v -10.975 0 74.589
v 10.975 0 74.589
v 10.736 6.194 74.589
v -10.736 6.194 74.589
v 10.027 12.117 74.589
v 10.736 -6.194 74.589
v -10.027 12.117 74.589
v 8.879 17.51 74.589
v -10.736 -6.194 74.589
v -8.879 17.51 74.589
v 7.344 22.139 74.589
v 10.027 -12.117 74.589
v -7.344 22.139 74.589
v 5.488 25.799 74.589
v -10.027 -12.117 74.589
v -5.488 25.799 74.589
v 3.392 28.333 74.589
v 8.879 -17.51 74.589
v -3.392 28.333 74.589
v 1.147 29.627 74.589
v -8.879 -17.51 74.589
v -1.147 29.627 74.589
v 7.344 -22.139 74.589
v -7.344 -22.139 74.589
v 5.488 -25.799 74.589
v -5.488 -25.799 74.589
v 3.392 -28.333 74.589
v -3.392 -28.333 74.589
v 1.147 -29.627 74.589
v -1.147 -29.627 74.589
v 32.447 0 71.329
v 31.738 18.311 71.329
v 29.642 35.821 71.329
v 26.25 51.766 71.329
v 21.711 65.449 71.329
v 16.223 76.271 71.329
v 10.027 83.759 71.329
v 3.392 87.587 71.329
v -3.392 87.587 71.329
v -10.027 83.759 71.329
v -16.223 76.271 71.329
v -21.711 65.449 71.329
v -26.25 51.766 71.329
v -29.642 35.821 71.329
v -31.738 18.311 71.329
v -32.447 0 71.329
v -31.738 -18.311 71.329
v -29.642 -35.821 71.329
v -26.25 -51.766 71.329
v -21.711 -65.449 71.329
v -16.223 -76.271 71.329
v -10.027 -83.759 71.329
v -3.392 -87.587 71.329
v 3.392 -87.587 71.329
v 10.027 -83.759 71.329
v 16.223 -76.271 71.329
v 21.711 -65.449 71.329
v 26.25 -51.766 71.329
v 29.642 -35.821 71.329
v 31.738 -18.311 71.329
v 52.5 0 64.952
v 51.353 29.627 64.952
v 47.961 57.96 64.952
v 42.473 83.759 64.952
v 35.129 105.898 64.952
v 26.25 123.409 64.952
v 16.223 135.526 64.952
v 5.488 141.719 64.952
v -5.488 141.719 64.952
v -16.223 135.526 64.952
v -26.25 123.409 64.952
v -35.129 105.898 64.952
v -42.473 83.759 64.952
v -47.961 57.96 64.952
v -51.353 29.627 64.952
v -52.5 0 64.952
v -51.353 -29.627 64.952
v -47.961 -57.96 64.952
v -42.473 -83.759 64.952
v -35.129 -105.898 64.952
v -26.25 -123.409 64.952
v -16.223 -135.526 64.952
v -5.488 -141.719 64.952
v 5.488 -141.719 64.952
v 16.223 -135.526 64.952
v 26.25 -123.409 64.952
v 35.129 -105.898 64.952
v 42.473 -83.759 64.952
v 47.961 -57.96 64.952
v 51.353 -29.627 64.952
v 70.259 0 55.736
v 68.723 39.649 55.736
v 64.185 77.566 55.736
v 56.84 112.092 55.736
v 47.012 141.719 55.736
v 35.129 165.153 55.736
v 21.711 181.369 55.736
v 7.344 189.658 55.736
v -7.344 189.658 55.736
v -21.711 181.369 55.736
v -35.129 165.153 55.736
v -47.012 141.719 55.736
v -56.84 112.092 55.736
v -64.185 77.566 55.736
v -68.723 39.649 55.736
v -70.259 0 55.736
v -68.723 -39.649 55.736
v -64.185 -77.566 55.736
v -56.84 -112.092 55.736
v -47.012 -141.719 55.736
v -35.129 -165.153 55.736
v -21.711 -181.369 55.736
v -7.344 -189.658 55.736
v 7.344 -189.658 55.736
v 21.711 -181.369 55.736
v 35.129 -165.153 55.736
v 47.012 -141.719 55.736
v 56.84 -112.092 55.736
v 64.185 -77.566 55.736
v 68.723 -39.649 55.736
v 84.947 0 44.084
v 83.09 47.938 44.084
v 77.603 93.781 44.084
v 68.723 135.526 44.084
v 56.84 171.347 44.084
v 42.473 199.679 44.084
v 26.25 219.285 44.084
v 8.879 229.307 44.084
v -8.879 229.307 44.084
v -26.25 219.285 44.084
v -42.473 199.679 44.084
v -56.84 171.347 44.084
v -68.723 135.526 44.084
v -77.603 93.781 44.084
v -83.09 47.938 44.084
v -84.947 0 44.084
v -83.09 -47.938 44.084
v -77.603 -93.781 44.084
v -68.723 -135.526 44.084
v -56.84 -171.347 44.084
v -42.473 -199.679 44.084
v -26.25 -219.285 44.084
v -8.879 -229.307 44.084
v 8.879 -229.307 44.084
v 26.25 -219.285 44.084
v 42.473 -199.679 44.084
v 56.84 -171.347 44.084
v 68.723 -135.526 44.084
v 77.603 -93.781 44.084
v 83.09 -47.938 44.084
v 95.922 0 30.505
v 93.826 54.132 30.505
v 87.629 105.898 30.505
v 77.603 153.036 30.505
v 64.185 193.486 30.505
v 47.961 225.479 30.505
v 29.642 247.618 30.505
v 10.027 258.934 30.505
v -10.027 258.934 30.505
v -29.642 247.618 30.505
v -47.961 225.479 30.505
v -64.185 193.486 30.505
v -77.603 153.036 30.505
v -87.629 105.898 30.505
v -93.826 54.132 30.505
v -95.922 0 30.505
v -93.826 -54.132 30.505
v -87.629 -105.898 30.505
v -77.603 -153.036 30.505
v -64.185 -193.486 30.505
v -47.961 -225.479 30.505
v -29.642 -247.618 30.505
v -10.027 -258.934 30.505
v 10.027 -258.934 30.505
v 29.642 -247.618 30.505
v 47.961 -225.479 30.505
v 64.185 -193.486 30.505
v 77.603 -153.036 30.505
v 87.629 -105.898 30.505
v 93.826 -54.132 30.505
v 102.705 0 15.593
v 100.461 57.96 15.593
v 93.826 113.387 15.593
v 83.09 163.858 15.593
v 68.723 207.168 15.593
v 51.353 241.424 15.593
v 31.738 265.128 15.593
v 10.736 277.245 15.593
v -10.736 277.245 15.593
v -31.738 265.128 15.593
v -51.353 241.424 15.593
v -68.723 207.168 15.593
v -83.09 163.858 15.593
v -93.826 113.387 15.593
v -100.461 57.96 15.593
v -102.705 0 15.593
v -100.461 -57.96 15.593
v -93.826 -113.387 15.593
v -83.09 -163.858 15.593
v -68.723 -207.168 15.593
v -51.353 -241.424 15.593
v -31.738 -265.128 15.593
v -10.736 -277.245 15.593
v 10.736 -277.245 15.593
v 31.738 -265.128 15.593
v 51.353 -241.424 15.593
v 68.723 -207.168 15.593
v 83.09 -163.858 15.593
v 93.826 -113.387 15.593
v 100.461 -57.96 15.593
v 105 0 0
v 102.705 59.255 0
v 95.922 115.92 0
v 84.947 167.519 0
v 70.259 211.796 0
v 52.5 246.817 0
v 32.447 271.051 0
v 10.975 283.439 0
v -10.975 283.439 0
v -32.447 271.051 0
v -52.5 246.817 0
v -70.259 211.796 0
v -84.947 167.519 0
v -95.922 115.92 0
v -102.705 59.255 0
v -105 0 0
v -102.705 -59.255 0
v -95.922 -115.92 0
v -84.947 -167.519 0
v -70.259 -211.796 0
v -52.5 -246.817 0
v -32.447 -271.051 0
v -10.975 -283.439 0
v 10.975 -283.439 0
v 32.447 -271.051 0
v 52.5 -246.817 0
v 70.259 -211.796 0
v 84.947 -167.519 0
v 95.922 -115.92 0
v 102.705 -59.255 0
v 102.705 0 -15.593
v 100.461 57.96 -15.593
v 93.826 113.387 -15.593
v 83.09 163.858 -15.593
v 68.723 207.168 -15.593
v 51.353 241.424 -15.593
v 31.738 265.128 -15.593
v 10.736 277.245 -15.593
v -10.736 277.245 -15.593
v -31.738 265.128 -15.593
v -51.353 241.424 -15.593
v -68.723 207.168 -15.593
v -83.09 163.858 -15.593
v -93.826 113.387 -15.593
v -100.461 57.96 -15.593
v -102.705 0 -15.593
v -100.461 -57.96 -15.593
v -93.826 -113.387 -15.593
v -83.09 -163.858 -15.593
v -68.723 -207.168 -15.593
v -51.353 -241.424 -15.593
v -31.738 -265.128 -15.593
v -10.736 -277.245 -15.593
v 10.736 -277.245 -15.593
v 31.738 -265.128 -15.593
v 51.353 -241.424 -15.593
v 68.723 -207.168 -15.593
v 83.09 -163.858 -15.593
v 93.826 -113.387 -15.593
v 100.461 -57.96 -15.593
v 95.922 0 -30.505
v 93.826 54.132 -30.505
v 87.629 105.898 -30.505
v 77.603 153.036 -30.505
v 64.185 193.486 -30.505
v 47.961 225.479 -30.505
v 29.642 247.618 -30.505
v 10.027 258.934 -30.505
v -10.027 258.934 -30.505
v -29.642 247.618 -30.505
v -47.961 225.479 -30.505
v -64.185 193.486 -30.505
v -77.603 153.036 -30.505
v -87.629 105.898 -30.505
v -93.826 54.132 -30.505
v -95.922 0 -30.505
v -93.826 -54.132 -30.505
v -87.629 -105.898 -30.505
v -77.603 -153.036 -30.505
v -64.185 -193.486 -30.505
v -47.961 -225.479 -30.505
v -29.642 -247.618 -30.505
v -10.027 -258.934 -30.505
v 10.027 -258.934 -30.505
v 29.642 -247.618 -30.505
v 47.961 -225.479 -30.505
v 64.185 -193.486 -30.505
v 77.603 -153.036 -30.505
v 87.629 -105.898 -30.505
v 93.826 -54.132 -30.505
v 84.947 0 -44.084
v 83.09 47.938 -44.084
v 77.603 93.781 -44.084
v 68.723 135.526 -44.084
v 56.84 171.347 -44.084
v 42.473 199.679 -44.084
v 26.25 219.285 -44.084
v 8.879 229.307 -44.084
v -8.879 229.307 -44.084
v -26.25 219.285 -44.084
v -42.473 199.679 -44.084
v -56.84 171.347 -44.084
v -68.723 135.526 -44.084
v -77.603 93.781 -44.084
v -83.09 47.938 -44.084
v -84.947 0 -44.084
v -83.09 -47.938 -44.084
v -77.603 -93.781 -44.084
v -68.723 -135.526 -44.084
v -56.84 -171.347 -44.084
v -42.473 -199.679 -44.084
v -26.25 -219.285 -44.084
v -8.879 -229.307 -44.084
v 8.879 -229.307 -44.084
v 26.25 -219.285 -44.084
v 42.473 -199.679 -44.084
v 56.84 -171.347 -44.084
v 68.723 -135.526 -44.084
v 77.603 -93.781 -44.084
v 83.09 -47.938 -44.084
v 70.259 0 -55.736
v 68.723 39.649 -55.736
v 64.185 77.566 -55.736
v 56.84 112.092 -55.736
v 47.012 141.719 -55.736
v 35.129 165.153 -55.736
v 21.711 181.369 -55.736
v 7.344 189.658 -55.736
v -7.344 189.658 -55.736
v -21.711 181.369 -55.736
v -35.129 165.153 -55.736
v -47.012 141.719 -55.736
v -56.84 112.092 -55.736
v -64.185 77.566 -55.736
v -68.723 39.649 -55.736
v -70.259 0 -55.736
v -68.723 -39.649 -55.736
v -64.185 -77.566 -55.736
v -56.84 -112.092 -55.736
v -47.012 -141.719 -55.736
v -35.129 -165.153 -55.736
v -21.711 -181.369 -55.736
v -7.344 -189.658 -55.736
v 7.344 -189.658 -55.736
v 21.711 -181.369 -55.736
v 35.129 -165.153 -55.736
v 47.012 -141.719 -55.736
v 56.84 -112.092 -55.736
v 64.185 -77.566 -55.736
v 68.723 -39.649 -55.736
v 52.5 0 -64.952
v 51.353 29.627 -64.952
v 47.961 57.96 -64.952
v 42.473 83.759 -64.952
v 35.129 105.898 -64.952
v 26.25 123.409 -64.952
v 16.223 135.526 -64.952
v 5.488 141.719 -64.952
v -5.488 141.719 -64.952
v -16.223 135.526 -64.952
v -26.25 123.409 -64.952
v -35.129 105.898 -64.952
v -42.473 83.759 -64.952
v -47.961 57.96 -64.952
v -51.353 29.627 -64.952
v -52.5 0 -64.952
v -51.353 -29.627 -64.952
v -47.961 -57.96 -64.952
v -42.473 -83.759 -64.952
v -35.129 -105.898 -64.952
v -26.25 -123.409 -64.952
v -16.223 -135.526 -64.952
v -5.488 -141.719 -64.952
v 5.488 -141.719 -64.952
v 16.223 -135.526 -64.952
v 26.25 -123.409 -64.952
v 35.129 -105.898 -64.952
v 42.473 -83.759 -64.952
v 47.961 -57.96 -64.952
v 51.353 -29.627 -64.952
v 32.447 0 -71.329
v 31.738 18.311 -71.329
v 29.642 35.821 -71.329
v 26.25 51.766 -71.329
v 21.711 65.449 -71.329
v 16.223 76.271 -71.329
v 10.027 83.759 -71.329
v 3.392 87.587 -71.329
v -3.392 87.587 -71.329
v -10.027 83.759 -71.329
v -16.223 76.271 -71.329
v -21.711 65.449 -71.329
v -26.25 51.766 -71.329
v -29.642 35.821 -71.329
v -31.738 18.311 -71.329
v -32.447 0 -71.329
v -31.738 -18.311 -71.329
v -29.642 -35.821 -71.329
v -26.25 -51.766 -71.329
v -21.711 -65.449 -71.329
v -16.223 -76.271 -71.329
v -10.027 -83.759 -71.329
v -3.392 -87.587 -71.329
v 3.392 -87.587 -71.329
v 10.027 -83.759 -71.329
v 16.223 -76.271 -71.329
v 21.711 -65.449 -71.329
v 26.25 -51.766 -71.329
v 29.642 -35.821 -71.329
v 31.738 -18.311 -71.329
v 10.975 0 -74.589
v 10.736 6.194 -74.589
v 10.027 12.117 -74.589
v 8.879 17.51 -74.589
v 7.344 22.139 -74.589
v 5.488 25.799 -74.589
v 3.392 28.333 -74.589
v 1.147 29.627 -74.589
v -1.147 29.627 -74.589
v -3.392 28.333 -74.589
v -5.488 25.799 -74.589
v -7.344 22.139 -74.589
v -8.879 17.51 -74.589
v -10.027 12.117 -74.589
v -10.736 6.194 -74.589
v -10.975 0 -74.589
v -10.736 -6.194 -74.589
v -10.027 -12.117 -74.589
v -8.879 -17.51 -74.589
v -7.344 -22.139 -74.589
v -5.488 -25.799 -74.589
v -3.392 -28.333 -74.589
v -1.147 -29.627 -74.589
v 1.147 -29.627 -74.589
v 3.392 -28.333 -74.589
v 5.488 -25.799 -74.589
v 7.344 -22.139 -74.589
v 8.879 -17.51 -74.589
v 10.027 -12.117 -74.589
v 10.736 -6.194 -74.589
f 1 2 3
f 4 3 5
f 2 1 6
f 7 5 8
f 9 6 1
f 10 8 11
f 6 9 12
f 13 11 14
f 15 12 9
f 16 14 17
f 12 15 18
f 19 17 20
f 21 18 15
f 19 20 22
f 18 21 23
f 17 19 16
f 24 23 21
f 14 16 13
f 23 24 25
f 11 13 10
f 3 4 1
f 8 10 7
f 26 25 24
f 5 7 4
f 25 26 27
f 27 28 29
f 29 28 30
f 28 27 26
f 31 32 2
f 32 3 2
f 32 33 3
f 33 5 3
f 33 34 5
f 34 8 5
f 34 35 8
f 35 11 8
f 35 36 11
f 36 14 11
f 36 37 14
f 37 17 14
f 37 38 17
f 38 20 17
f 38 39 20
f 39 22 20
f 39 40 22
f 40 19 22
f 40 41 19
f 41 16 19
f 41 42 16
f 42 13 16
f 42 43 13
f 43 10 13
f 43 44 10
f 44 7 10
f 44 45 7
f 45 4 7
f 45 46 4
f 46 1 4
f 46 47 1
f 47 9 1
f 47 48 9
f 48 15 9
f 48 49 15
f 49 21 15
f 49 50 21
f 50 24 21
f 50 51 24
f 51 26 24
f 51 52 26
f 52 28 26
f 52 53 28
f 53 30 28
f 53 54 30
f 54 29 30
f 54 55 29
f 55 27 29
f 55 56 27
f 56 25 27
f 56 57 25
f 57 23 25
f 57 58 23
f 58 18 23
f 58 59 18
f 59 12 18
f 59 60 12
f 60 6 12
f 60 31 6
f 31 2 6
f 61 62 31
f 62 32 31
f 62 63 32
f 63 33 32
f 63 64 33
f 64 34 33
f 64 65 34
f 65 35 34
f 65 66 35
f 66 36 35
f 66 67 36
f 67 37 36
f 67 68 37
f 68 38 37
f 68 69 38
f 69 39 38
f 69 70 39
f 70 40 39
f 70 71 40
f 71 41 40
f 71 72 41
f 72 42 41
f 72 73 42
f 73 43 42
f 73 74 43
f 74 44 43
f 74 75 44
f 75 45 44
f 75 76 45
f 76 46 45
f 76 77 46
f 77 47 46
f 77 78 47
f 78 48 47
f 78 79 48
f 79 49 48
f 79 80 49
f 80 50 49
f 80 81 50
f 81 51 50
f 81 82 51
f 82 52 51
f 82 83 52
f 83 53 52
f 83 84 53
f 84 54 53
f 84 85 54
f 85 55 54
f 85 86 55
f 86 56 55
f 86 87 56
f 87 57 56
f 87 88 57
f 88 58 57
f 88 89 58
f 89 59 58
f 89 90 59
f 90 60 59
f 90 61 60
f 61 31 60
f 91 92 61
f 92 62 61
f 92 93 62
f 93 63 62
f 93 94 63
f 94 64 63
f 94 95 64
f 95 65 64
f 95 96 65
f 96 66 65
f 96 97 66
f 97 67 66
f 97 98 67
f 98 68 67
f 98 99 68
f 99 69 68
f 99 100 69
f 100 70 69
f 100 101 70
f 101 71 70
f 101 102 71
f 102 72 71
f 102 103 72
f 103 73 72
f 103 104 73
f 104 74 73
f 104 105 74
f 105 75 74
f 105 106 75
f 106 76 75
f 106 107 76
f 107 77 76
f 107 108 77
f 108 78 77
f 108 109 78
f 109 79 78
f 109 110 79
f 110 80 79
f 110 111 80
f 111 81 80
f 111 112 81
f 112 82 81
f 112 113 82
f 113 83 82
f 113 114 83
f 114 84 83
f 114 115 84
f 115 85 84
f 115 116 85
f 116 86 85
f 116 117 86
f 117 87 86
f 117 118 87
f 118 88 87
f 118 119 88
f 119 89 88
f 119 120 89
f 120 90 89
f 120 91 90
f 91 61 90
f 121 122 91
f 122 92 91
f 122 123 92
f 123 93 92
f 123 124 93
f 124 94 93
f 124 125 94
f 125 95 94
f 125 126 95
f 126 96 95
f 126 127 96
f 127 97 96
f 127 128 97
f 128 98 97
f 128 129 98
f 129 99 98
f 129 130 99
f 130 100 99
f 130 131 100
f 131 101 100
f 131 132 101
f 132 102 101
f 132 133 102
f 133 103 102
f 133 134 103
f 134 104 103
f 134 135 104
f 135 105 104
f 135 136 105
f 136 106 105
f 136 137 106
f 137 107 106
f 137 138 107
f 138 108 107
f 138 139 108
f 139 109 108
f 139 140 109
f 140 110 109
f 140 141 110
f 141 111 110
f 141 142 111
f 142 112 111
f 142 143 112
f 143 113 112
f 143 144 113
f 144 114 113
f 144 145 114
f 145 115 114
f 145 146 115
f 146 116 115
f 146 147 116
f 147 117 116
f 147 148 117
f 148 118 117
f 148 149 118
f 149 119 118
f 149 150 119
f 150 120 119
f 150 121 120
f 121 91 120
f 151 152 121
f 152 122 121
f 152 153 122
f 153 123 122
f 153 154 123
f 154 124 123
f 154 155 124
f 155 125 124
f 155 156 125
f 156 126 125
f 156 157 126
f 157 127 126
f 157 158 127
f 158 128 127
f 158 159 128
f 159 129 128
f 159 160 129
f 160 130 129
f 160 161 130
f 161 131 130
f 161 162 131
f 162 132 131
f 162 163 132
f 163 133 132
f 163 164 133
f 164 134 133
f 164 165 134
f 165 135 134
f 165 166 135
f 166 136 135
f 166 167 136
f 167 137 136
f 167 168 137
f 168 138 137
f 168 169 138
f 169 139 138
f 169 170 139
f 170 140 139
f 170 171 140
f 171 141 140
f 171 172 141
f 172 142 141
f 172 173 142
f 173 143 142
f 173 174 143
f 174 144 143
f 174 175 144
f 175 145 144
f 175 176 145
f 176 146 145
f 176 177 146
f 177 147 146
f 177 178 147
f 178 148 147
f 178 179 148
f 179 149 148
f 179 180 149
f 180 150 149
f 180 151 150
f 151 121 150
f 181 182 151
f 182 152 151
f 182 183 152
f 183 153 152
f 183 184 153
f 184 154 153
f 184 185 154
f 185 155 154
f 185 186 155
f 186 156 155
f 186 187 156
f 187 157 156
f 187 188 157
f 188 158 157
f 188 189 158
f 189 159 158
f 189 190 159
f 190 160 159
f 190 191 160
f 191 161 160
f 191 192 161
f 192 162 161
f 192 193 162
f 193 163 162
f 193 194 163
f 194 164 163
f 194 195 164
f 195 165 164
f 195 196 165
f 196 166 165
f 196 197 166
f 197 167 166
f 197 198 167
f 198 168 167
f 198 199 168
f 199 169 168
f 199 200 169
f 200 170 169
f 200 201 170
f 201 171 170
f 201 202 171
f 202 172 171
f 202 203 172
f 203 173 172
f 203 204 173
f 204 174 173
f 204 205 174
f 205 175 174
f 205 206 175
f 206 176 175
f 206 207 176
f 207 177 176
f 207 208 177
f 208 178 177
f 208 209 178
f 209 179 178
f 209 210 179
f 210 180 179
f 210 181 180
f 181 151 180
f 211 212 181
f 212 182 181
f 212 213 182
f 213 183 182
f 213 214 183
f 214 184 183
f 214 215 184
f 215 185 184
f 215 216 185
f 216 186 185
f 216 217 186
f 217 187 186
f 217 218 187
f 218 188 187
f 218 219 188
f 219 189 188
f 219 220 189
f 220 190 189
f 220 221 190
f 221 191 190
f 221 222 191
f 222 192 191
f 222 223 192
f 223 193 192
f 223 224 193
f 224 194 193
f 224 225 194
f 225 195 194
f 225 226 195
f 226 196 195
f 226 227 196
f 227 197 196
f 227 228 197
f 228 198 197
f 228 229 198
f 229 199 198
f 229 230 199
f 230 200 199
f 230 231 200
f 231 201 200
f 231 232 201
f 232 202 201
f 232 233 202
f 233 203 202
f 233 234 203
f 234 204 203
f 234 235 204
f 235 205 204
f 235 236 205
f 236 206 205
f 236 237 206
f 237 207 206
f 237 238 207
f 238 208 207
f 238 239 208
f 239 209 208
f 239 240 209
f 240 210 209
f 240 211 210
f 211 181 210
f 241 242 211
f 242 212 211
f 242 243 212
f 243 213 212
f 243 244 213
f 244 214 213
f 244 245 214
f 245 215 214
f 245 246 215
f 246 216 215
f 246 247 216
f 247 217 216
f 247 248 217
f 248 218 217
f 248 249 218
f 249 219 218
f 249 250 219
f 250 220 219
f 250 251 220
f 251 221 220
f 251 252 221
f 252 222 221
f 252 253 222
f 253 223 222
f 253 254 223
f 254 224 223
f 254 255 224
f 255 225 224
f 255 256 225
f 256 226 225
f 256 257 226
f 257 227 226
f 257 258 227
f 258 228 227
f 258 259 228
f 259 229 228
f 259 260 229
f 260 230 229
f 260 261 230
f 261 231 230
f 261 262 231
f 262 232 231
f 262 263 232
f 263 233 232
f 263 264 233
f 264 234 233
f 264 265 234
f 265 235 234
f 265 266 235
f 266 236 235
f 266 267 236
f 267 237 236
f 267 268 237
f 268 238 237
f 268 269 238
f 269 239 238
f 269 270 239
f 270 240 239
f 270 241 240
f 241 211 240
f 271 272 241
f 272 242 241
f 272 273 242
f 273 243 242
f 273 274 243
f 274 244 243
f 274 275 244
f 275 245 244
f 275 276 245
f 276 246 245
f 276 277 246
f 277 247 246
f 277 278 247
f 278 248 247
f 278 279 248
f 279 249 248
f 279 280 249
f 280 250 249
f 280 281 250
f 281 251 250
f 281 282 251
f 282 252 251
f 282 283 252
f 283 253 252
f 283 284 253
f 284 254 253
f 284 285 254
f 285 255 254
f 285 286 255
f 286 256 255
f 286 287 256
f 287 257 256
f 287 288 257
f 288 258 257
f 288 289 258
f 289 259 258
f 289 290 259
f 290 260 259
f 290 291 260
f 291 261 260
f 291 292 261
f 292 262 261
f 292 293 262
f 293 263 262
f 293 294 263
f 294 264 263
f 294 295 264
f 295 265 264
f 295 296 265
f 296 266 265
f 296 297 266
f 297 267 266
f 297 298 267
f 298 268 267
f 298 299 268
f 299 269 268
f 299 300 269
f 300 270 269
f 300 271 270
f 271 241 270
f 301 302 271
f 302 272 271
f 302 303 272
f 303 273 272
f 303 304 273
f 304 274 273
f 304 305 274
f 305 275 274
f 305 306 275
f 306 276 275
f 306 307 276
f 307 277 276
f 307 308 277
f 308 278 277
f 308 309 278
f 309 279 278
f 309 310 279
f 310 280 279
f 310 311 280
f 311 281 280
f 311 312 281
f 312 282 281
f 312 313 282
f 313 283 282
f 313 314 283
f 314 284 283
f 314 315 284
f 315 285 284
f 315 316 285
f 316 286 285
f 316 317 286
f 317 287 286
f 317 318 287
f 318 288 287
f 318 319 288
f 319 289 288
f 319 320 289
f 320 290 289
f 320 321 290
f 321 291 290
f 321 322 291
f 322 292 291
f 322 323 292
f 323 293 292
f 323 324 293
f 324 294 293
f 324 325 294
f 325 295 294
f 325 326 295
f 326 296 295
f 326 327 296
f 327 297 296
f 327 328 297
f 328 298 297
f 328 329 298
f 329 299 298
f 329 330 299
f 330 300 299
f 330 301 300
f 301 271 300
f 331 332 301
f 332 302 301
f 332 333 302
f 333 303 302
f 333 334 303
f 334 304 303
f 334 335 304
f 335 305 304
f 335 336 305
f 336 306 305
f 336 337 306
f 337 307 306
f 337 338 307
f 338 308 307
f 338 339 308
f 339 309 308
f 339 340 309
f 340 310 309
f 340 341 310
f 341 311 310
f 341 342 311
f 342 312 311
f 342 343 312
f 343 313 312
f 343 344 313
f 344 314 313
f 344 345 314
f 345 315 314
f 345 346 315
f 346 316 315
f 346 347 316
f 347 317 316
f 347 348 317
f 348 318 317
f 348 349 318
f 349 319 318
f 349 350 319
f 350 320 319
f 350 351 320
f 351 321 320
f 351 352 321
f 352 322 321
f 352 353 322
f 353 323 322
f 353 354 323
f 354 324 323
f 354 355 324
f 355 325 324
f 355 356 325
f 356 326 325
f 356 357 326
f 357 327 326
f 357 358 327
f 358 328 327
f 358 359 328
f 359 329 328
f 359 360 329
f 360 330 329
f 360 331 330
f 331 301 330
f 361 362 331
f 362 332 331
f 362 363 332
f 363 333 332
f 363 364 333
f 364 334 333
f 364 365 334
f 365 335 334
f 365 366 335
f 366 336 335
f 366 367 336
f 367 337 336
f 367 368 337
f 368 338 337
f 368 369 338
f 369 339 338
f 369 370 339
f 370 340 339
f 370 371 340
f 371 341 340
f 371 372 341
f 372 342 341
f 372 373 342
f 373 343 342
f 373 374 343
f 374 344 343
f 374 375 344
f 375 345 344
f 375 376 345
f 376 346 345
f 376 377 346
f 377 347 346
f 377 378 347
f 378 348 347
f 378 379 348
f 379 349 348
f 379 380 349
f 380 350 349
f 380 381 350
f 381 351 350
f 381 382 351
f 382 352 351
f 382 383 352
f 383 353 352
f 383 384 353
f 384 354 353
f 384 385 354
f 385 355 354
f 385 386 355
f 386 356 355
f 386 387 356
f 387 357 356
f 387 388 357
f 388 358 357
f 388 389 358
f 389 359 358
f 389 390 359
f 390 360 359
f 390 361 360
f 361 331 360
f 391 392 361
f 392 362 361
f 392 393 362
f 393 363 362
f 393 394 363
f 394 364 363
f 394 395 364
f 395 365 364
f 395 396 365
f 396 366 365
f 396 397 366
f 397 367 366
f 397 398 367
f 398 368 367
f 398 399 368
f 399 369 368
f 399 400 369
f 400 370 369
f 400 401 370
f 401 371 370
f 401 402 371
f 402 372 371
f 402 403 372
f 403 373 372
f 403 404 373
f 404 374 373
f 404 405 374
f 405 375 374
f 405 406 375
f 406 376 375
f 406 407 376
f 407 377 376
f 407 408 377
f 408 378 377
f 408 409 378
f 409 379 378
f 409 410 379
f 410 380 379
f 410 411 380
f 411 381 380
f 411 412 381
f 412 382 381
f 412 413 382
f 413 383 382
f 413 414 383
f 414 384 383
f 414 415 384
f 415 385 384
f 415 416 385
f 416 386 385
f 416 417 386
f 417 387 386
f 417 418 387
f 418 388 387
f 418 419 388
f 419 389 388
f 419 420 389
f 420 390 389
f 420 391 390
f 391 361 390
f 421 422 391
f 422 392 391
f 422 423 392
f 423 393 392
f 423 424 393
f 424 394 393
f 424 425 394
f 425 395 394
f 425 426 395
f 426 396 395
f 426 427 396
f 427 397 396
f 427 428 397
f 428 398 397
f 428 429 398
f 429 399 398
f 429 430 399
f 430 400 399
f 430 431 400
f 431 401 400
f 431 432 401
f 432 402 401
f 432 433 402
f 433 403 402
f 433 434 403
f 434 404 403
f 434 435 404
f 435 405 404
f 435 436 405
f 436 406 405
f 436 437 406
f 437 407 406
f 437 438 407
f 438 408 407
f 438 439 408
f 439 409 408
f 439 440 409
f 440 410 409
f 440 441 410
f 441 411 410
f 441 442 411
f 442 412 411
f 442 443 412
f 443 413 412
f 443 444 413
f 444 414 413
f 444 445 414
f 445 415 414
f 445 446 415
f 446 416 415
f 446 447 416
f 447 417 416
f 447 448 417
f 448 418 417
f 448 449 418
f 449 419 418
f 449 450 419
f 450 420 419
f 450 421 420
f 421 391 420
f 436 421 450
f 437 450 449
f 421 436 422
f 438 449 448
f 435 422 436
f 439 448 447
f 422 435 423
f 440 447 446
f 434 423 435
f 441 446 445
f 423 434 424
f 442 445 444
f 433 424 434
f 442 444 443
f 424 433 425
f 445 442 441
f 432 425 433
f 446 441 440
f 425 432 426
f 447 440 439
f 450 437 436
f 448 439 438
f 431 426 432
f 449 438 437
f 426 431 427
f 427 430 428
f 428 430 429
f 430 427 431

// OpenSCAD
// Generated by SolidPython 1.0.1 on 2020-07-29 00:46:48


scale(v = [7, 19, 5]) {
	sphere(r = 15);
}
/***********************************************
*********      SolidPython code:      **********
************************************************
 
# import packages: SolidPython
from solid import *
from solid.utils import *
from itertools import chain, combinations, permutations


class Resize:

    def __init__(self, scad_file):
        self.scad_file = scad_file
        #self.scad_file = import_scad(scad_file)
        # cone/cylinder param:
        self.r1 = 0
        self.r2 = 0
        self.h = 0
        # rectangular prism param:
        self.w = 0
        self.l = 0
        # ellipse param:
        self.r = 0

    # import OpenScad code (file name corresponds to shape)


    # classify shape + parameters
    def assign(self, param1, param2, param3):
        if self.scad_file == 'cone.scad':
            self.r1 = param1
            self.r2 = param2
            self.h = param3
        elif self.scad_file == 'cylinder.scad':
            self.r1 = param1
            self.r2 = param2
            self.h = param3
        elif self.scad_file == 'rectangularPrism.scad':
            self.h = param1
            self.l = param2
            self.w = param3
        else:
            self.r = param1
            self.h = param2

    # resize parameters
    def iterate(self):
        x = range(3, 20, 2)
        i = 1
        if self.scad_file == 'cone.scad':
            tempList = list(permutations(x, 2))
            for temp in tempList:
                param1 = temp[0]
                param2 = temp[1]
                filepath = 'produced_scad_files/' + 'cone' + str(param1) + '_' + str(param2) + '_' + '.scad'
                scad_render_to_file(cylinder(h=param1, r1=param2, r2=0), filepath)

        elif self.scad_file == 'cylinder.scad':
            tempList = list(permutations(x, 3))
            for temp in tempList:
                param1 = temp[0]
                param2 = temp[1]
                filepath = 'produced_scad_files/' + 'cylinder' + str(param1) + '_' + str(param2) + '_' + '.scad'
                scad_render_to_file(cylinder(h=param1, r1=param2, r2=param2), filepath)

        elif self.scad_file == 'rectangularPrism.scad':
            tempList = list(permutations(x, 3))
            for temp in tempList:
                param1 = temp[0]
                param2 = temp[1]
                param3 = temp[2]
                filepath = 'produced_scad_files/' + 'rectangularPrism' + str(param1) + '_' + str(param2) + '_' + str(
                    param3) + '.scad'
                scad_render_to_file(cube(size=(param1, param2, param3)), filepath)

        elif self.scad_file == 'ellipse.scad':
            tempList = list(permutations(x, 4))
            for temp in tempList:
                param1 = temp[0]
                param2 = temp[1]
                param3 = temp[2]
                param4 = temp[3]
                filepath = 'produced_scad_files/' + 'ellipse' + str(param1) + '_' + str(param2) + '_' + str(param3) + '_' + str(param4) + '.scad'
                scad_render_to_file(scale([param1, param2, param3])(sphere(r=param4)), filepath)

    def render_to_scadfile(self):
        scad_render_to_file(scad, 'example.scad') 
 
************************************************/
